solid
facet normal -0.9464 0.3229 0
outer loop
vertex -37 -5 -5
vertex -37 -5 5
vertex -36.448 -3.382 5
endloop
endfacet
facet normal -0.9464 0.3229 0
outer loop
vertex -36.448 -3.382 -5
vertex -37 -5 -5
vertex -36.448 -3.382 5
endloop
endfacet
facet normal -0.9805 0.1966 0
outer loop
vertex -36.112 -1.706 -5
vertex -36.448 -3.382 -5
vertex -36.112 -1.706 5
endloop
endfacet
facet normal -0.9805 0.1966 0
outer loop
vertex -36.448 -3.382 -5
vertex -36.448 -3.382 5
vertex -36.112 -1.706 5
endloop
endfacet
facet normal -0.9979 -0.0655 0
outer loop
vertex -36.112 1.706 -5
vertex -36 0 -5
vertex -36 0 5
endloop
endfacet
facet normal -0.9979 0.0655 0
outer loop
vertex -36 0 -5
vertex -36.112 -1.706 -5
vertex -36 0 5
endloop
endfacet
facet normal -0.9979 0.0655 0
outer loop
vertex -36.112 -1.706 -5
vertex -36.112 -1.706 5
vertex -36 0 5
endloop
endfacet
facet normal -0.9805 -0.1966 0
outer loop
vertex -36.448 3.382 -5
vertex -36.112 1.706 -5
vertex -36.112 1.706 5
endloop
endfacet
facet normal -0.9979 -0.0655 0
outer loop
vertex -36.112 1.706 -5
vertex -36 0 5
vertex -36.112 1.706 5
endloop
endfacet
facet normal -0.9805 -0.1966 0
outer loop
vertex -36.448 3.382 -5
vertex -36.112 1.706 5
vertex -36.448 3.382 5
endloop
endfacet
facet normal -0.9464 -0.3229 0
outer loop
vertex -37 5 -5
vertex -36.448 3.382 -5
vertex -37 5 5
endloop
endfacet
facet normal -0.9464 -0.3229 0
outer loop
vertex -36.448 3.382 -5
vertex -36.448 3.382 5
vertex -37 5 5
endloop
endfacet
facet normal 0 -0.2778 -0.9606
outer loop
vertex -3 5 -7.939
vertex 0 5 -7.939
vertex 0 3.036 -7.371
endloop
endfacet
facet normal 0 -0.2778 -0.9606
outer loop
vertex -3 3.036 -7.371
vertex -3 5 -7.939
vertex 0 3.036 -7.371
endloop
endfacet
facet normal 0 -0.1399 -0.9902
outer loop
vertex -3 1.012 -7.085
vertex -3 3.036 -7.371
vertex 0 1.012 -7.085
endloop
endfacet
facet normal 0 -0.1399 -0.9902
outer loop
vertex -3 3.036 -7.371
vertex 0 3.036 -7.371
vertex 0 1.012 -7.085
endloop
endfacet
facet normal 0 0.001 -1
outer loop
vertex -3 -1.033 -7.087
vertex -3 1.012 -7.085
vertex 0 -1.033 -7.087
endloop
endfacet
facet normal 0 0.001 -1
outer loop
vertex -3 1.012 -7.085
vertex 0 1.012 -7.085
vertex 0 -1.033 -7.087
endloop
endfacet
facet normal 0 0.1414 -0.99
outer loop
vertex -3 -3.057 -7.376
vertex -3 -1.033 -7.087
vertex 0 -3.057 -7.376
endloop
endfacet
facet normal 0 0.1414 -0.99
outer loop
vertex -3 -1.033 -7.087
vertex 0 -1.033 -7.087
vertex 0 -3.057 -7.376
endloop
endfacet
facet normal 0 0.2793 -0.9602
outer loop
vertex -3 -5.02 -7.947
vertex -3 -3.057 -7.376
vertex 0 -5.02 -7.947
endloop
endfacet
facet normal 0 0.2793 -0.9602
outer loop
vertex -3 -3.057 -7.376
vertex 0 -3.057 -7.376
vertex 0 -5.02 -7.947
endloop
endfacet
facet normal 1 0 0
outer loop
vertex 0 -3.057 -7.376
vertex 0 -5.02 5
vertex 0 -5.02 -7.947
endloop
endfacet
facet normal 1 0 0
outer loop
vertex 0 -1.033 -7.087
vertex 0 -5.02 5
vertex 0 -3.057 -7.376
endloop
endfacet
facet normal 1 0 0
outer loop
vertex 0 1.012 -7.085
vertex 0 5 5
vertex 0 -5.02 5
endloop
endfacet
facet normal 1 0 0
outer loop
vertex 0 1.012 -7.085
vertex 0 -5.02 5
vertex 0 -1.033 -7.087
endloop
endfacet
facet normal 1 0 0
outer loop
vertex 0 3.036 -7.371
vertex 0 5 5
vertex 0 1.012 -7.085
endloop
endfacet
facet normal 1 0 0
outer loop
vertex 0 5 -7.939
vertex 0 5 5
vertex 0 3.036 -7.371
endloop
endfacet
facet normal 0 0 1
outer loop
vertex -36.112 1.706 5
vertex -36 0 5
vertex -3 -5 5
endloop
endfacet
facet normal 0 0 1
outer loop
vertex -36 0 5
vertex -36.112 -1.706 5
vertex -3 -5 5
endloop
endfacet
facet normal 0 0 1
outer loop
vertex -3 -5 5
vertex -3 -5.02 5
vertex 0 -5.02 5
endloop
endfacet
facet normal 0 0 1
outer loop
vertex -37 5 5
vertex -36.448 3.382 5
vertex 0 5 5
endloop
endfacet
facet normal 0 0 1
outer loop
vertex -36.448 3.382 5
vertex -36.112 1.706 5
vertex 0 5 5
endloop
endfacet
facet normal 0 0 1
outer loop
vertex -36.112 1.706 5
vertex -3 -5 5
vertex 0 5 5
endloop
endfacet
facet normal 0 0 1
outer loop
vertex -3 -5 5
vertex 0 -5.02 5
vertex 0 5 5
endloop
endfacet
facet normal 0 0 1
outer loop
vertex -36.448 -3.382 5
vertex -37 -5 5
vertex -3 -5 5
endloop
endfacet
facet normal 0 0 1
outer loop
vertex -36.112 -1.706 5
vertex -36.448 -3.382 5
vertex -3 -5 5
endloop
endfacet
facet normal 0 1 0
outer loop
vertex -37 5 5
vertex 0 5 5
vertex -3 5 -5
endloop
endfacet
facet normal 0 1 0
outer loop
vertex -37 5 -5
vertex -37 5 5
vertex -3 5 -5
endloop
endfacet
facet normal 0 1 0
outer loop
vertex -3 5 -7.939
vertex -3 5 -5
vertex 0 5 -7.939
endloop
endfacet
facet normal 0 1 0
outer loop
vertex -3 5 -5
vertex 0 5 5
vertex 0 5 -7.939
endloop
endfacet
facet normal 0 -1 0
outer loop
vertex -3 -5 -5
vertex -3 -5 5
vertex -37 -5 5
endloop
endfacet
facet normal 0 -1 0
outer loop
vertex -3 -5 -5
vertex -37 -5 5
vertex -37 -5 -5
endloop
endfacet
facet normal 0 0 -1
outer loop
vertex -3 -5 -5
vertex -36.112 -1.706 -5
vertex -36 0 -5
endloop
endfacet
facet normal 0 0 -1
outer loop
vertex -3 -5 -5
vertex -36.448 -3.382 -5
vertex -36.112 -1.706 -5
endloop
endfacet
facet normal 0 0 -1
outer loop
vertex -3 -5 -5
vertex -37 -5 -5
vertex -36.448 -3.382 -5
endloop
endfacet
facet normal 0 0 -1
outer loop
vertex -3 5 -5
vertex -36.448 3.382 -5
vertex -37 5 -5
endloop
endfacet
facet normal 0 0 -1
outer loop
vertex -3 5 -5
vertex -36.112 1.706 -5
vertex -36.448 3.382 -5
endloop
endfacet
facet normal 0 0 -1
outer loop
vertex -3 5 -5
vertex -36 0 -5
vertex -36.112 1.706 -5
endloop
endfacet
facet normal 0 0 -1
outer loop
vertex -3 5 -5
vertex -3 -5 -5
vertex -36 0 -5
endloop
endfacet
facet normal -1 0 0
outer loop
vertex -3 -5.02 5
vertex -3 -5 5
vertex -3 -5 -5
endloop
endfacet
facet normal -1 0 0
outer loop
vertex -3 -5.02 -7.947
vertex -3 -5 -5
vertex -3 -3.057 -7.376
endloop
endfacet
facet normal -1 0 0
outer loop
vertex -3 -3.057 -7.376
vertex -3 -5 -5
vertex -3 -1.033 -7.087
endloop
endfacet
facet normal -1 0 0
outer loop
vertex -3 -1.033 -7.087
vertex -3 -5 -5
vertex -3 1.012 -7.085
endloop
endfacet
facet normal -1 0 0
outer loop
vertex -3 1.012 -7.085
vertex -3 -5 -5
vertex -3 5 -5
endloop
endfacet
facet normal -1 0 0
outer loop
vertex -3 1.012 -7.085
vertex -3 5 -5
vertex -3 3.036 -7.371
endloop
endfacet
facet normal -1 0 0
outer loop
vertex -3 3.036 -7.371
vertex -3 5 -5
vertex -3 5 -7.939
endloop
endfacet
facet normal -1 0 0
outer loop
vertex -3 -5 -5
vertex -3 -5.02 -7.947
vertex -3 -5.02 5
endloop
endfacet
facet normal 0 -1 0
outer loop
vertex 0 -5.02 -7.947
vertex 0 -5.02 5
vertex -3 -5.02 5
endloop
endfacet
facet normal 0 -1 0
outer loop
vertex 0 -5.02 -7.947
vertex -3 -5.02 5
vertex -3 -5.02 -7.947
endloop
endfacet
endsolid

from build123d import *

# Parameters (mm, degrees)
ESBO_O1_W             = 10
ESBO_O1_H             = 10
EXTRUS_O1_DEPTH       = 40
ESBO_O2_W             = 14.229592149
ESBO_O2_H             = 10.020208066
EXTRUS_O2_DEPTH       = 3
ESBO_O3_R             = 14.5
CORTE_EXTRUS_O1_DEPTH = 23
ESBO_O4_R             = 13
CORTE_EXTRUS_O2_DEPTH = 23


with BuildPart() as part:
    # Esboço1 → Extrusão1 (new body)
    with BuildSketch(Plane(origin=(0, 0, 0), x_dir=(0, 0, -1), z_dir=(1, 0, 0))):
        Rectangle(ESBO_O1_W, ESBO_O1_H)
    extrude(amount=-EXTRUS_O1_DEPTH)

    # Esboço2 → Extrusão2 (add)
    with BuildSketch(Plane(origin=(0, 0, 0), x_dir=(0, 0, -1), z_dir=(1, 0, 0))):
        with Locations((2.114796075, -0.010104033)):
            Rectangle(ESBO_O2_W, ESBO_O2_H)
    extrude(amount=-EXTRUS_O2_DEPTH)

    # Esboço3 → Corte-extrusão1 (cut)
    with BuildSketch(Plane(origin=(0, 0, 0), x_dir=(0, 0, -1), z_dir=(1, 0, 0))):
        with Locations((21.55, 0)):
            Circle(ESBO_O3_R)
    extrude(amount=-CORTE_EXTRUS_O1_DEPTH, mode=Mode.SUBTRACT)

    # Esboço4 → Corte-extrusão2 (cut)
    with BuildSketch(Plane.XY.offset(5)):
        with Locations((-49, 0)):
            Circle(ESBO_O4_R)
    extrude(amount=-CORTE_EXTRUS_O2_DEPTH, mode=Mode.SUBTRACT)


solid = part.part
